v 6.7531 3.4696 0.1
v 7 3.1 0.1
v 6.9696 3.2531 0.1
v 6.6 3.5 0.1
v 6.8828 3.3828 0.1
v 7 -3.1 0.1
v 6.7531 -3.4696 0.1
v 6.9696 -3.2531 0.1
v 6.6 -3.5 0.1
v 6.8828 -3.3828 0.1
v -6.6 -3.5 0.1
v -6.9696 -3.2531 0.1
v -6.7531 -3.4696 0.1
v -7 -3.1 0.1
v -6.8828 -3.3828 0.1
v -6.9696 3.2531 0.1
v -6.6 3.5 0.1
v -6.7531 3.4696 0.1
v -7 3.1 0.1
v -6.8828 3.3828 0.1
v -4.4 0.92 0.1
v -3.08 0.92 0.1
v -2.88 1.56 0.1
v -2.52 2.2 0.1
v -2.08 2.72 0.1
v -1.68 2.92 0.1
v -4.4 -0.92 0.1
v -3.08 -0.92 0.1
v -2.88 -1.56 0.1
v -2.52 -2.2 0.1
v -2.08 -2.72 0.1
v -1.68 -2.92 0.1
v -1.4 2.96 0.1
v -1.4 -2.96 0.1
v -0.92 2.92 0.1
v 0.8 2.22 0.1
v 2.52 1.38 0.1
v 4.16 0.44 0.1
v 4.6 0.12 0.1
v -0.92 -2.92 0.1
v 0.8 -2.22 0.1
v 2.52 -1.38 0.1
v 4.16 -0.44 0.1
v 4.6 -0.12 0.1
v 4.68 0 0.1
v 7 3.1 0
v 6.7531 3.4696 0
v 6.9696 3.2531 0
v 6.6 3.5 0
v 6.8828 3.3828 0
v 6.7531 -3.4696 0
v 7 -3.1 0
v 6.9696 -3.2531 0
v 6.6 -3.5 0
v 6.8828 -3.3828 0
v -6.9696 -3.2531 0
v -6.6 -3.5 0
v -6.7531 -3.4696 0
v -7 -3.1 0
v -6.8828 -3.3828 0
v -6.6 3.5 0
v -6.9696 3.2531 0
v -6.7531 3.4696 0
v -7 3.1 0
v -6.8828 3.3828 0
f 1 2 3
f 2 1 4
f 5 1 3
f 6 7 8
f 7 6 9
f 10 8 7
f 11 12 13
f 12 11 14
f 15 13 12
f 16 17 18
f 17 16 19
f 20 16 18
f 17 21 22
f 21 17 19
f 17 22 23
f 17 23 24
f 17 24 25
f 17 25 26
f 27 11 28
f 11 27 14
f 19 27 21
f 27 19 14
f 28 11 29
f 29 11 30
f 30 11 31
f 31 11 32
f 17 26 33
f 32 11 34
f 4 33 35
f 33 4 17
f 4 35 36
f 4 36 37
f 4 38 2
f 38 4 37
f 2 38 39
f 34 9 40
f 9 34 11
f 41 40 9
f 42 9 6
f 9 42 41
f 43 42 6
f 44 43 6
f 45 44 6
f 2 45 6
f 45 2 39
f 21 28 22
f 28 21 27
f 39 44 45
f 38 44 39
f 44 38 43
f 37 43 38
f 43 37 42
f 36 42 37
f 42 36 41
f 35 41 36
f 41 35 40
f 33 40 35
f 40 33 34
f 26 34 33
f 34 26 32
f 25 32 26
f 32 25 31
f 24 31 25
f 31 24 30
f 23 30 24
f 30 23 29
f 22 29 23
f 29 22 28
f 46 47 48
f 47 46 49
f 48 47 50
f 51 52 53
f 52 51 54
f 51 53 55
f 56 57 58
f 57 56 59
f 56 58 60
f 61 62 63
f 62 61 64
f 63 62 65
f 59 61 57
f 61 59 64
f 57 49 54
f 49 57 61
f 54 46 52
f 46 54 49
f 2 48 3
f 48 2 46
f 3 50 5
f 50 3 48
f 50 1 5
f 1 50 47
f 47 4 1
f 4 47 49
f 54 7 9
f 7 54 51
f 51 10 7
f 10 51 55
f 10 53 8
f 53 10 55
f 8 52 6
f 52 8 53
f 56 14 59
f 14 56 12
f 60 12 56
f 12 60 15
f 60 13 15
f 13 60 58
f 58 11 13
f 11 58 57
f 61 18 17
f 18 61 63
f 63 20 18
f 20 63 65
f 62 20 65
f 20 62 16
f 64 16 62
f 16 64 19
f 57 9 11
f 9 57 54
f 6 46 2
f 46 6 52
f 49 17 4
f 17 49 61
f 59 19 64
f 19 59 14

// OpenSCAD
// file: ../p/4-4edge.scad
use <../lib.scad>
$fa=1; $fs=0.2;
function ldraw_lib__4_4edge(realsolid=false) = [
// 0 Circle 1.0
// 0 Name: 4-4edge.dat
// 0 Author: James Jessiman
// 0 !LDRAW_ORG Primitive UPDATE 2017-01
// 0 !LICENSE Licensed under CC BY 2.0 and CC BY 4.0 : see CAreadme.txt
// 
// 0 BFC CERTIFY CCW
  [0,"BFC","CERTIFY"],
  [0,"BFC","CCW"],
// 
// 0 !HISTORY 1998-12-15 [PTadmin] Official Update 1998-10
// 0 !HISTORY 2005-12-28 [PTadmin] Official Update 2005-01
// 0 !HISTORY 2007-06-24 [PTadmin] Header formatted for Contributor Agreement
// 0 !HISTORY 2008-07-01 [PTadmin] Official Update 2008-01
// 0 !HISTORY 2017-01-15 [Steffen] BFCed
// 0 !HISTORY 2017-12-30 [PTadmin] Official Update 2017-01
// 
// 
// 2 24 1 0 0 0.9239 0 0.3827
  [2,24,1,0,0,0.9239,0,0.3827],
// 2 24 0.9239 0 0.3827 0.7071 0 0.7071
  [2,24,0.9239,0,0.3827,0.7071,0,0.7071],
// 2 24 0.7071 0 0.7071 0.3827 0 0.9239
  [2,24,0.7071,0,0.7071,0.3827,0,0.9239],
// 2 24 0.3827 0 0.9239 0 0 1
  [2,24,0.3827,0,0.9239,0,0,1],
// 2 24 0 0 1 -0.3827 0 0.9239
  [2,24,0,0,1,-0.3827,0,0.9239],
// 2 24 -0.3827 0 0.9239 -0.7071 0 0.7071
  [2,24,-0.3827,0,0.9239,-0.7071,0,0.7071],
// 2 24 -0.7071 0 0.7071 -0.9239 0 0.3827
  [2,24,-0.7071,0,0.7071,-0.9239,0,0.3827],
// 2 24 -0.9239 0 0.3827 -1 0 -0
  [2,24,-0.9239,0,0.3827,-1,0,-0],
// 2 24 -1 0 -0 -0.9239 0 -0.3827
  [2,24,-1,0,-0,-0.9239,0,-0.3827],
// 2 24 -0.9239 0 -0.3827 -0.7071 0 -0.7071
  [2,24,-0.9239,0,-0.3827,-0.7071,0,-0.7071],
// 2 24 -0.7071 0 -0.7071 -0.3827 0 -0.9239
  [2,24,-0.7071,0,-0.7071,-0.3827,0,-0.9239],
// 2 24 -0.3827 0 -0.9239 0 0 -1
  [2,24,-0.3827,0,-0.9239,0,0,-1],
// 2 24 0 0 -1 0.3827 0 -0.9239
  [2,24,0,0,-1,0.3827,0,-0.9239],
// 2 24 0.3827 0 -0.9239 0.7071 0 -0.7071
  [2,24,0.3827,0,-0.9239,0.7071,0,-0.7071],
// 2 24 0.7071 0 -0.7071 0.9239 0 -0.3827
  [2,24,0.7071,0,-0.7071,0.9239,0,-0.3827],
// 2 24 0.9239 0 -0.3827 1 0 0
  [2,24,0.9239,0,-0.3827,1,0,0],
];
module ldraw_lib__4_4edge(step=0, col=false, unit=2/5, alt=false, line=0.2, solid=!$preview)
    makepoly(ldraw_lib__4_4edge(solid), step=step, col=col, unit=unit, alt=alt, line=line, solid=solid);
ldraw_lib__4_4edge(line=0.2);
// file: ../p/4-4disc.scad
use <../lib.scad>
$fa=1; $fs=0.2;
function ldraw_lib__4_4disc(realsolid=false) = [
// 0 Disc 1.0
// 0 Name: 4-4disc.dat
// 0 Author: James Jessiman
// 0 !LDRAW_ORG Primitive UPDATE 2002-02
// 0 !LICENSE Licensed under CC BY 2.0 and CC BY 4.0 : see CAreadme.txt
// 
// 0 BFC CERTIFY CCW
  [0,"BFC","CERTIFY"],
  [0,"BFC","CCW"],
// 
// 0 !HISTORY 1998-12-15 [PTadmin] Official Update 1998-10
// 0 !HISTORY 2002-03-23 [sbliss] Added BFC statement
// 0 !HISTORY 2002-04-25 [PTadmin] Official Update 2002-02
// 0 !HISTORY 2007-06-24 [PTadmin] Header formatted for Contributor Agreement
// 0 !HISTORY 2008-07-01 [PTadmin] Official Update 2008-01
// 
// 
// 3 16 0 0 0 1 0 0 0.9239 0 0.3827
  [3,16,0,0,0,1,0,0,0.9239,0,0.3827],
// 3 16 0 0 0 0.9239 0 0.3827 0.7071 0 0.7071
  [3,16,0,0,0,0.9239,0,0.3827,0.7071,0,0.7071],
// 3 16 0 0 0 0.7071 0 0.7071 0.3827 0 0.9239
  [3,16,0,0,0,0.7071,0,0.7071,0.3827,0,0.9239],
// 3 16 0 0 0 0.3827 0 0.9239 0 0 1
  [3,16,0,0,0,0.3827,0,0.9239,0,0,1],
// 3 16 0 0 0 0 0 1 -0.3827 0 0.9239
  [3,16,0,0,0,0,0,1,-0.3827,0,0.9239],
// 3 16 0 0 0 -0.3827 0 0.9239 -0.7071 0 0.7071
  [3,16,0,0,0,-0.3827,0,0.9239,-0.7071,0,0.7071],
// 3 16 0 0 0 -0.7071 0 0.7071 -0.9239 0 0.3827
  [3,16,0,0,0,-0.7071,0,0.7071,-0.9239,0,0.3827],
// 3 16 0 0 0 -0.9239 0 0.3827 -1 0 -0
  [3,16,0,0,0,-0.9239,0,0.3827,-1,0,-0],
// 3 16 0 0 0 -1 0 -0 -0.9239 0 -0.3827
  [3,16,0,0,0,-1,0,-0,-0.9239,0,-0.3827],
// 3 16 0 0 0 -0.9239 0 -0.3827 -0.7071 0 -0.7071
  [3,16,0,0,0,-0.9239,0,-0.3827,-0.7071,0,-0.7071],
// 3 16 0 0 0 -0.7071 0 -0.7071 -0.3827 0 -0.9239
  [3,16,0,0,0,-0.7071,0,-0.7071,-0.3827,0,-0.9239],
// 3 16 0 0 0 -0.3827 0 -0.9239 0 0 -1
  [3,16,0,0,0,-0.3827,0,-0.9239,0,0,-1],
// 3 16 0 0 0 0 0 -1 0.3827 0 -0.9239
  [3,16,0,0,0,0,0,-1,0.3827,0,-0.9239],
// 3 16 0 0 0 0.3827 0 -0.9239 0.7071 0 -0.7071
  [3,16,0,0,0,0.3827,0,-0.9239,0.7071,0,-0.7071],
// 3 16 0 0 0 0.7071 0 -0.7071 0.9239 0 -0.3827
  [3,16,0,0,0,0.7071,0,-0.7071,0.9239,0,-0.3827],
// 3 16 0 0 0 0.9239 0 -0.3827 1 0 0
  [3,16,0,0,0,0.9239,0,-0.3827,1,0,0],
// 0
];
module ldraw_lib__4_4disc(step=0, col=false, unit=2/5, alt=false, line=0.2, solid=!$preview)
    makepoly(ldraw_lib__4_4disc(solid), step=step, col=col, unit=unit, alt=alt, line=line, solid=solid);
ldraw_lib__4_4disc(line=0.2);
// file: ../p/4-4cyli.scad
use <../lib.scad>
$fa=1; $fs=0.2;
function ldraw_lib__4_4cyli(realsolid=false) = [
// 0 Cylinder 1.0
// 0 Name: 4-4cyli.dat
// 0 Author: James Jessiman
// 0 !LDRAW_ORG Primitive UPDATE 2005-01
// 0 !LICENSE Licensed under CC BY 2.0 and CC BY 4.0 : see CAreadme.txt
// 
// 0 BFC CERTIFY CCW
  [0,"BFC","CERTIFY"],
  [0,"BFC","CCW"],
// 
// 0 !HISTORY 1998-12-15 [PTadmin] Official Update 1998-10
// 0 !HISTORY 2002-03-23 [sbliss] Added BFC statement; merged headers from files in distributions LDraw 0.27 and Complete.
// 0 !HISTORY 2002-04-25 [PTadmin] Official Update 2002-02
// 0 !HISTORY 2004-12-14 [guyvivan] BFC CCW
// 0 !HISTORY 2005-12-28 [PTadmin] Official Update 2005-01
// 0 !HISTORY 2007-06-24 [PTadmin] Header formatted for Contributor Agreement
// 0 !HISTORY 2008-07-01 [PTadmin] Official Update 2008-01
// 
// 
// 4 16 1 1 0 0.9239 1 0.3827 0.9239 0 0.3827 1 0 0
  [4,16,1,1,0,0.9239,1,0.3827,0.9239,0,0.3827,1,0,0],
// 5 24 1 0 0 1 1 0 0.9239 0 0.3827 0.9239 0 -0.3827
  [5,24,1,0,0,1,1,0,0.9239,0,0.3827,0.9239,0,-0.3827],
// 4 16 0.9239 1 0.3827 0.7071 1 0.7071 0.7071 0 0.7071 0.9239 0 0.3827
  [4,16,0.9239,1,0.3827,0.7071,1,0.7071,0.7071,0,0.7071,0.9239,0,0.3827],
// 5 24 0.9239 0 0.3827 0.9239 1 0.3827 0.7071 0 0.7071 1 0 0
  [5,24,0.9239,0,0.3827,0.9239,1,0.3827,0.7071,0,0.7071,1,0,0],
// 4 16 0.7071 1 0.7071 0.3827 1 0.9239 0.3827 0 0.9239 0.7071 0 0.7071
  [4,16,0.7071,1,0.7071,0.3827,1,0.9239,0.3827,0,0.9239,0.7071,0,0.7071],
// 5 24 0.7071 0 0.7071 0.7071 1 0.7071 0.3827 0 0.9239 0.9239 0 0.3827
  [5,24,0.7071,0,0.7071,0.7071,1,0.7071,0.3827,0,0.9239,0.9239,0,0.3827],
// 4 16 0.3827 1 0.9239 0 1 1 0 0 1 0.3827 0 0.9239
  [4,16,0.3827,1,0.9239,0,1,1,0,0,1,0.3827,0,0.9239],
// 5 24 0.3827 0 0.9239 0.3827 1 0.9239 0 0 1 0.7071 0 0.7071
  [5,24,0.3827,0,0.9239,0.3827,1,0.9239,0,0,1,0.7071,0,0.7071],
// 4 16 0 1 1 -0.3827 1 0.9239 -0.3827 0 0.9239 0 0 1
  [4,16,0,1,1,-0.3827,1,0.9239,-0.3827,0,0.9239,0,0,1],
// 5 24 0 0 1 0 1 1 -0.3827 0 0.9239 0.3827 0 0.9239
  [5,24,0,0,1,0,1,1,-0.3827,0,0.9239,0.3827,0,0.9239],
// 4 16 -0.3827 1 0.9239 -0.7071 1 0.7071 -0.7071 0 0.7071 -0.3827 0 0.9239
  [4,16,-0.3827,1,0.9239,-0.7071,1,0.7071,-0.7071,0,0.7071,-0.3827,0,0.9239],
// 5 24 -0.3827 0 0.9239 -0.3827 1 0.9239 -0.7071 0 0.7071 0 0 1
  [5,24,-0.3827,0,0.9239,-0.3827,1,0.9239,-0.7071,0,0.7071,0,0,1],
// 4 16 -0.7071 1 0.7071 -0.9239 1 0.3827 -0.9239 0 0.3827 -0.7071 0 0.7071
  [4,16,-0.7071,1,0.7071,-0.9239,1,0.3827,-0.9239,0,0.3827,-0.7071,0,0.7071],
// 5 24 -0.7071 0 0.7071 -0.7071 1 0.7071 -0.9239 0 0.3827 -0.3827 0 0.9239
  [5,24,-0.7071,0,0.7071,-0.7071,1,0.7071,-0.9239,0,0.3827,-0.3827,0,0.9239],
// 4 16 -0.9239 1 0.3827 -1 1 0 -1 0 0 -0.9239 0 0.3827
  [4,16,-0.9239,1,0.3827,-1,1,0,-1,0,0,-0.9239,0,0.3827],
// 5 24 -0.9239 0 0.3827 -0.9239 1 0.3827 -1 0 0 -0.7071 0 0.7071
  [5,24,-0.9239,0,0.3827,-0.9239,1,0.3827,-1,0,0,-0.7071,0,0.7071],
// 4 16 -1 1 0 -0.9239 1 -0.3827 -0.9239 0 -0.3827 -1 0 0
  [4,16,-1,1,0,-0.9239,1,-0.3827,-0.9239,0,-0.3827,-1,0,0],
// 5 24 -1 0 0 -1 1 0 -0.9239 0 -0.3827 -0.9239 0 0.3827
  [5,24,-1,0,0,-1,1,0,-0.9239,0,-0.3827,-0.9239,0,0.3827],
// 4 16 -0.9239 1 -0.3827 -0.7071 1 -0.7071 -0.7071 0 -0.7071 -0.9239 0 -0.3827
  [4,16,-0.9239,1,-0.3827,-0.7071,1,-0.7071,-0.7071,0,-0.7071,-0.9239,0,-0.3827],
// 5 24 -0.9239 0 -0.3827 -0.9239 1 -0.3827 -0.7071 0 -0.7071 -1 0 0
  [5,24,-0.9239,0,-0.3827,-0.9239,1,-0.3827,-0.7071,0,-0.7071,-1,0,0],
// 4 16 -0.7071 1 -0.7071 -0.3827 1 -0.9239 -0.3827 0 -0.9239 -0.7071 0 -0.7071
  [4,16,-0.7071,1,-0.7071,-0.3827,1,-0.9239,-0.3827,0,-0.9239,-0.7071,0,-0.7071],
// 5 24 -0.7071 0 -0.7071 -0.7071 1 -0.7071 -0.3827 0 -0.9239 -0.9239 0 -0.3827
  [5,24,-0.7071,0,-0.7071,-0.7071,1,-0.7071,-0.3827,0,-0.9239,-0.9239,0,-0.3827],
// 4 16 -0.3827 1 -0.9239 0 1 -1 0 0 -1 -0.3827 0 -0.9239
  [4,16,-0.3827,1,-0.9239,0,1,-1,0,0,-1,-0.3827,0,-0.9239],
// 5 24 -0.3827 0 -0.9239 -0.3827 1 -0.9239 0 0 -1 -0.7071 0 -0.7071
  [5,24,-0.3827,0,-0.9239,-0.3827,1,-0.9239,0,0,-1,-0.7071,0,-0.7071],
// 4 16 0 1 -1 0.3827 1 -0.9239 0.3827 0 -0.9239 0 0 -1
  [4,16,0,1,-1,0.3827,1,-0.9239,0.3827,0,-0.9239,0,0,-1],
// 5 24 0 0 -1 0 1 -1 0.3827 0 -0.9239 -0.3827 0 -0.9239
  [5,24,0,0,-1,0,1,-1,0.3827,0,-0.9239,-0.3827,0,-0.9239],
// 4 16 0.3827 1 -0.9239 0.7071 1 -0.7071 0.7071 0 -0.7071 0.3827 0 -0.9239
  [4,16,0.3827,1,-0.9239,0.7071,1,-0.7071,0.7071,0,-0.7071,0.3827,0,-0.9239],
// 5 24 0.3827 0 -0.9239 0.3827 1 -0.9239 0.7071 0 -0.7071 0 0 -1
  [5,24,0.3827,0,-0.9239,0.3827,1,-0.9239,0.7071,0,-0.7071,0,0,-1],
// 4 16 0.7071 1 -0.7071 0.9239 1 -0.3827 0.9239 0 -0.3827 0.7071 0 -0.7071
  [4,16,0.7071,1,-0.7071,0.9239,1,-0.3827,0.9239,0,-0.3827,0.7071,0,-0.7071],
// 5 24 0.7071 0 -0.7071 0.7071 1 -0.7071 0.9239 0 -0.3827 0.3827 0 -0.9239
  [5,24,0.7071,0,-0.7071,0.7071,1,-0.7071,0.9239,0,-0.3827,0.3827,0,-0.9239],
// 4 16 0.9239 1 -0.3827 1 1 0 1 0 0 0.9239 0 -0.3827
  [4,16,0.9239,1,-0.3827,1,1,0,1,0,0,0.9239,0,-0.3827],
// 5 24 0.9239 0 -0.3827 0.9239 1 -0.3827 1 0 0 0.7071 0 -0.7071
  [5,24,0.9239,0,-0.3827,0.9239,1,-0.3827,1,0,0,0.7071,0,-0.7071],
// 0
];
module ldraw_lib__4_4cyli(step=0, col=false, unit=2/5, alt=false, line=0.2, solid=!$preview)
    makepoly(ldraw_lib__4_4cyli(solid), step=step, col=col, unit=unit, alt=alt, line=line, solid=solid);
ldraw_lib__4_4cyli(line=0.2);
// file: ../p/stud3.scad
use <../lib.scad>
use <4-4cyli.scad>
use <4-4disc.scad>
use <4-4edge.scad>
$fa=1; $fs=0.2;
function ldraw_lib__stud3(realsolid=false) = realsolid ? 
    [openscad(translate([0,0,-eps()], o=cylinder(4+eps(), r=4)),2)] : [
// 0 Stud Tube Solid
// 0 Name: stud3.dat
// 0 Author: James Jessiman
// 0 !LDRAW_ORG Primitive UPDATE 2012-01
// 0 !LICENSE Licensed under CC BY 2.0 and CC BY 4.0 : see CAreadme.txt
// 
// 0 BFC CERTIFY CCW
  [0,"BFC","CERTIFY"],
  [0,"BFC","CCW"],
// 
// 0 !HISTORY 2002-04-04 [sbliss] Modified for BFC compliance
// 0 !HISTORY 2002-04-25 [PTadmin] Official Update 2002-02
// 0 !HISTORY 2007-06-24 [PTadmin] Header formatted for Contributor Agreement
// 0 !HISTORY 2008-07-01 [PTadmin] Official Update 2008-01
// 0 !HISTORY 2012-02-16 [Philo] Changed to CCW
// 0 !HISTORY 2012-03-30 [PTadmin] Official Update 2012-01
// 
// 
// 1 16 0 -4 0 4 0 0 0 1 0 0 0 4 4-4edge.dat
  [1,16,0,-4,0,4,0,0,0,1,0,0,0,4, ldraw_lib__4_4edge(realsolid)],
// 1 16 0 0 0 4 0 0 0 1 0 0 0 4 4-4edge.dat
  [1,16,0,0,0,4,0,0,0,1,0,0,0,4, ldraw_lib__4_4edge(realsolid)],
// 1 16 0 -4 0 4 0 0 0 1 0 0 0 4 4-4disc.dat
  [1,16,0,-4,0,4,0,0,0,1,0,0,0,4, ldraw_lib__4_4disc(realsolid)],
// 1 16 0 -4 0 4 0 0 0 4 0 0 0 4 4-4cyli.dat
  [1,16,0,-4,0,4,0,0,0,4,0,0,0,4, ldraw_lib__4_4cyli(realsolid)],
];
module ldraw_lib__stud3(step=0, col=false, unit=2/5, alt=false, line=0.2, solid=!$preview)
    makepoly(ldraw_lib__stud3(solid), step=step, col=col, unit=unit, alt=alt, line=line, solid=solid);
ldraw_lib__stud3(line=0.2);
// file: ../p/stud.scad
use <../lib.scad>
use <4-4cyli.scad>
use <4-4disc.scad>
use <4-4edge.scad>
$fa=1; $fs=0.2;
function ldraw_lib__stud(realsolid=false) = realsolid ? 
    [openscad(translate([0,0,-eps()], o=cylinder(4+eps(), r=6)),2)] : [
// 0 Stud
// 0 Name: stud.dat
// 0 Author: James Jessiman
// 0 !LDRAW_ORG Primitive UPDATE 2012-01
// 0 !LICENSE Licensed under CC BY 2.0 and CC BY 4.0 : see CAreadme.txt
// 
// 0 BFC CERTIFY CCW
  [0,"BFC","CERTIFY"],
  [0,"BFC","CCW"],
// 
// 0 !HISTORY 2002-04-04 [sbliss] Modified for BFC compliance
// 0 !HISTORY 2002-04-25 [PTadmin] Official Update 2002-02
// 0 !HISTORY 2007-06-24 [PTadmin] Header formatted for Contributor Agreement
// 0 !HISTORY 2008-07-01 [PTadmin] Official Update 2008-01
// 0 !HISTORY 2012-02-16 [Philo] Changed to CCW
// 0 !HISTORY 2012-03-30 [PTadmin] Official Update 2012-01
// 
// 
// 1 16 0 0 0 6 0 0 0 1 0 0 0 6 4-4edge.dat
  [1,16,0,0,0,6,0,0,0,1,0,0,0,6, ldraw_lib__4_4edge(realsolid)],
// 1 16 0 -4 0 6 0 0 0 1 0 0 0 6 4-4edge.dat
  [1,16,0,-4,0,6,0,0,0,1,0,0,0,6, ldraw_lib__4_4edge(realsolid)],
// 1 16 0 0 0 6 0 0 0 -4 0 0 0 6 4-4cyli.dat
  [1,16,0,0,0,6,0,0,0,-4,0,0,0,6, ldraw_lib__4_4cyli(realsolid)],
// 1 16 0 -4 0 6 0 0 0 1 0 0 0 6 4-4disc.dat
  [1,16,0,-4,0,6,0,0,0,1,0,0,0,6, ldraw_lib__4_4disc(realsolid)],
];
module ldraw_lib__stud(step=0, col=false, unit=2/5, alt=false, line=0.2, solid=!$preview)
    makepoly(ldraw_lib__stud(solid), step=step, col=col, unit=unit, alt=alt, line=line, solid=solid);
ldraw_lib__stud(line=0.2);
// file: ../p/box5.scad
use <../lib.scad>
$fa=1; $fs=0.2;
function ldraw_lib__box5(realsolid=false) = [
// 0 Box with 5 Faces and All Edges
// 0 Name: box5.dat
// 0 Author: James Jessiman
// 0 !LDRAW_ORG Primitive UPDATE 2012-01
// 0 !LICENSE Licensed under CC BY 2.0 and CC BY 4.0 : see CAreadme.txt
// 
// 0 BFC CERTIFY CCW
  [0,"BFC","CERTIFY"],
  [0,"BFC","CCW"],
// 
// 0 !HISTORY 2002-04-03 [sbliss] Modified for BFC compliance
// 0 !HISTORY 2002-04-25 [PTadmin] Official Update 2002-02
// 0 !HISTORY 2007-06-24 [PTadmin] Header formatted for Contributor Agreement
// 0 !HISTORY 2008-07-01 [PTadmin] Official Update 2008-01
// 0 !HISTORY 2012-02-16 [Philo] Changed to CCW
// 0 !HISTORY 2012-03-30 [PTadmin] Official Update 2012-01
// 
// 
// 2 24 1 1 1 -1 1 1
  [2,24,1,1,1,-1,1,1],
// 2 24 -1 1 1 -1 1 -1
  [2,24,-1,1,1,-1,1,-1],
// 2 24 -1 1 -1 1 1 -1
  [2,24,-1,1,-1,1,1,-1],
// 2 24 1 1 -1 1 1 1
  [2,24,1,1,-1,1,1,1],
// 2 24 1 0 1 -1 0 1
  [2,24,1,0,1,-1,0,1],
// 2 24 -1 0 1 -1 0 -1
  [2,24,-1,0,1,-1,0,-1],
// 2 24 -1 0 -1 1 0 -1
  [2,24,-1,0,-1,1,0,-1],
// 2 24 1 0 -1 1 0 1
  [2,24,1,0,-1,1,0,1],
// 2 24 1 0 1 1 1 1
  [2,24,1,0,1,1,1,1],
// 2 24 -1 0 1 -1 1 1
  [2,24,-1,0,1,-1,1,1],
// 2 24 1 0 -1 1 1 -1
  [2,24,1,0,-1,1,1,-1],
// 2 24 -1 0 -1 -1 1 -1
  [2,24,-1,0,-1,-1,1,-1],
// 4 16 -1 1 1 1 1 1 1 1 -1 -1 1 -1
  [4,16,-1,1,1,1,1,1,1,1,-1,-1,1,-1],
// 4 16 -1 1 1 -1 0 1 1 0 1 1 1 1
  [4,16,-1,1,1,-1,0,1,1,0,1,1,1,1],
// 4 16 -1 1 -1 -1 0 -1 -1 0 1 -1 1 1
  [4,16,-1,1,-1,-1,0,-1,-1,0,1,-1,1,1],
// 4 16 1 1 -1 1 0 -1 -1 0 -1 -1 1 -1
  [4,16,1,1,-1,1,0,-1,-1,0,-1,-1,1,-1],
// 4 16 1 1 1 1 0 1 1 0 -1 1 1 -1
  [4,16,1,1,1,1,0,1,1,0,-1,1,1,-1],
];
module ldraw_lib__box5(step=0, col=false, unit=2/5, alt=false, line=0.2, solid=!$preview)
    makepoly(ldraw_lib__box5(solid), step=step, col=col, unit=unit, alt=alt, line=line, solid=solid);
ldraw_lib__box5(line=0.2);
// file: ../p/box4t.scad
use <../lib.scad>
$fa=1; $fs=0.2;
function ldraw_lib__box4t(realsolid=false) = [
// 0 Box with 4 Adjacent Faces and All Edges
// 0 Name: box4t.dat
// 0 Author: Tore Eriksson [Tore_Eriksson]
// 0 !LDRAW_ORG Primitive UPDATE 2003-02
// 0 !LICENSE Licensed under CC BY 2.0 and CC BY 4.0 : see CAreadme.txt
// 
// 0 BFC CERTIFY CCW
  [0,"BFC","CERTIFY"],
  [0,"BFC","CCW"],
// 
// 0 !HISTORY 1997-09-29 [PTadmin] Official Update 1997-15
// 0 !HISTORY 2002-08-31 [izanette] Modified with WINDZ for BFC compliance
// 0 !HISTORY 2003-08-01 [PTadmin] Official Update 2003-02
// 0 !HISTORY 2007-06-24 [PTadmin] Header formatted for Contributor Agreement
// 0 !HISTORY 2008-07-01 [PTadmin] Official Update 2008-01
// 
// 
// 2 24 1 1 1 -1 1 1
  [2,24,1,1,1,-1,1,1],
// 2 24 -1 1 1 -1 1 -1
  [2,24,-1,1,1,-1,1,-1],
// 2 24 -1 1 -1 1 1 -1
  [2,24,-1,1,-1,1,1,-1],
// 2 24 1 1 -1 1 1 1
  [2,24,1,1,-1,1,1,1],
// 2 24 1 0 1 -1 0 1
  [2,24,1,0,1,-1,0,1],
// 2 24 -1 0 1 -1 0 -1
  [2,24,-1,0,1,-1,0,-1],
// 2 24 -1 0 -1 1 0 -1
  [2,24,-1,0,-1,1,0,-1],
// 2 24 1 0 -1 1 0 1
  [2,24,1,0,-1,1,0,1],
// 2 24 1 0 1 1 1 1
  [2,24,1,0,1,1,1,1],
// 2 24 -1 0 1 -1 1 1
  [2,24,-1,0,1,-1,1,1],
// 2 24 1 0 -1 1 1 -1
  [2,24,1,0,-1,1,1,-1],
// 2 24 -1 0 -1 -1 1 -1
  [2,24,-1,0,-1,-1,1,-1],
// 4 16 1 1 1 1 1 -1 -1 1 -1 -1 1 1
  [4,16,1,1,1,1,1,-1,-1,1,-1,-1,1,1],
// 4 16 1 1 1 -1 1 1 -1 0 1 1 0 1
  [4,16,1,1,1,-1,1,1,-1,0,1,1,0,1],
// 4 16 -1 1 1 -1 1 -1 -1 0 -1 -1 0 1
  [4,16,-1,1,1,-1,1,-1,-1,0,-1,-1,0,1],
// 0 4 16 -1 1 -1 -1 0 -1 1 0 -1 1 1 -1
// 4 16 1 1 -1 1 1 1 1 0 1 1 0 -1
  [4,16,1,1,-1,1,1,1,1,0,1,1,0,-1],
// 0
];
module ldraw_lib__box4t(step=0, col=false, unit=2/5, alt=false, line=0.2, solid=!$preview)
    makepoly(ldraw_lib__box4t(solid), step=step, col=col, unit=unit, alt=alt, line=line, solid=solid);
ldraw_lib__box4t(line=0.2);
// file: s/3004s01.scad
use <../../lib.scad>
use <../../p/box4t.scad>
use <../../p/box5.scad>
use <../../p/stud.scad>
use <../../p/stud3.scad>
$fa=1; $fs=0.2;
function ldraw_lib__s__3004s01(realsolid=false) = [
// 0 ~Brick  1 x  2 without Front Face
// 0 Name: s\3004s01.dat
// 0 Author: James Jessiman
// 0 !LDRAW_ORG Subpart UPDATE 2003-03
// 0 !LICENSE Licensed under CC BY 2.0 and CC BY 4.0 : see CAreadme.txt
// 
// 0 BFC CERTIFY CCW
  [0,"BFC","CERTIFY"],
  [0,"BFC","CCW"],
// 
// 0 !HISTORY 2003-09-07 [jriley] Subfiling, BFC
// 0 !HISTORY 2003-12-19 [PTadmin] Official Update 2003-03
// 0 !HISTORY 2007-08-29 [PTadmin] Header formatted for Contributor Agreement
// 0 !HISTORY 2008-07-01 [PTadmin] Official Update 2008-01
// 
// 
// 1 16 0 4 0 1 0 0 0 -5 0 0 0 1 stud3.dat
  [1,16,0,4,0,1,0,0,0,-5,0,0,0,1, ldraw_lib__stud3(realsolid)],
// 0 BFC INVERTNEXT
  [0,"BFC","INVERTNEXT"],
// 1 16 0 24 0 16 0 0 0 -20 0 0 0 6 box5.dat
  [1,16,0,24,0,16,0,0,0,-20,0,0,0,6, ldraw_lib__box5(realsolid)],
// 4 16 20 24 10 16 24 6 -16 24 6 -20 24 10
  [4,16,20,24,10,16,24,6,-16,24,6,-20,24,10],
// 4 16 -20 24 10 -16 24 6 -16 24 -6 -20 24 -10
  [4,16,-20,24,10,-16,24,6,-16,24,-6,-20,24,-10],
// 4 16 -20 24 -10 -16 24 -6 16 24 -6 20 24 -10
  [4,16,-20,24,-10,-16,24,-6,16,24,-6,20,24,-10],
// 4 16 20 24 -10 16 24 -6 16 24 6 20 24 10
  [4,16,20,24,-10,16,24,-6,16,24,6,20,24,10],
// 1 16 0 24 0 20 0 0 0 -24 0 0 0 10 box4t.dat
  [1,16,0,24,0,20,0,0,0,-24,0,0,0,10, ldraw_lib__box4t(realsolid)],
// 1 16 10 0 0 1 0 0 0 1 0 0 0 1 stud.dat
  [1,16,10,0,0,1,0,0,0,1,0,0,0,1, ldraw_lib__stud(realsolid)],
// 1 16 -10 0 0 1 0 0 0 1 0 0 0 1 stud.dat
  [1,16,-10,0,0,1,0,0,0,1,0,0,0,1, ldraw_lib__stud(realsolid)],
// 0
];
module ldraw_lib__s__3004s01(step=0, col=false, unit=2/5, alt=false, line=0.2, solid=!$preview)
    makepoly(ldraw_lib__s__3004s01(solid), step=step, col=col, unit=unit, alt=alt, line=line, solid=solid);
ldraw_lib__s__3004s01(line=0.2);
// file: 3004.scad
use <../lib.scad>
use <s/3004s01.scad>
$fa=1; $fs=0.2;
function ldraw_lib__3004(realsolid=false) = [
// 0 Brick  1 x  2
// 0 Name: 3004.dat
// 0 Author: James Jessiman
// 0 !LDRAW_ORG Part UPDATE 2022-05
// 0 !LICENSE Licensed under CC BY 2.0 and CC BY 4.0 : see CAreadme.txt
// 
// 0 BFC CERTIFY CCW
  [0,"BFC","CERTIFY"],
  [0,"BFC","CCW"],
// 
// 0 !HISTORY 2001-10-26 [PTadmin] Official Update 2001-01
// 0 !HISTORY 2002-05-07 {unknown} BFC Certification
// 0 !HISTORY 2002-06-11 [PTadmin] Official Update 2002-03
// 0 !HISTORY 2007-05-07 [PTadmin] Header formatted for Contributor Agreement
// 0 !HISTORY 2008-07-01 [PTadmin] Official Update 2008-01
// 0 !HISTORY 2022-08-04 [MagFors] Using subfile
// 0 !HISTORY 2022-09-15 [PTadmin] Official Update 2022-05
// 
// 
// 1 16 0 0 0 1 0 0 0 1 0 0 0 1 s\3004s01.dat
  [1,16,0,0,0,1,0,0,0,1,0,0,0,1, ldraw_lib__s__3004s01(realsolid)],
// 4 16 -20 24 -10 20 24 -10 20 0 -10 -20 0 -10
  [4,16,-20,24,-10,20,24,-10,20,0,-10,-20,0,-10],
];
module ldraw_lib__3004(step=0, col=false, unit=2/5, alt=false, line=0.2, solid=!$preview)
    makepoly(ldraw_lib__3004(solid), step=step, col=col, unit=unit, alt=alt, line=line, solid=solid);
ldraw_lib__3004(line=0.2);
// file: ../p/1-4cyli.scad
use <../lib.scad>
$fa=1; $fs=0.2;
function ldraw_lib__1_4cyli(realsolid=false) = [
// 0 Cylinder 0.25
// 0 Name: 1-4cyli.dat
// 0 Author: James Jessiman
// 0 !LDRAW_ORG Primitive UPDATE 2012-01
// 0 !LICENSE Licensed under CC BY 2.0 and CC BY 4.0 : see CAreadme.txt
// 
// 0 BFC CERTIFY CCW
  [0,"BFC","CERTIFY"],
  [0,"BFC","CCW"],
// 
// 0 !HISTORY 2002-03-23 [sbliss] Added BFC statement.
// 0 !HISTORY 2002-04-25 [PTadmin] Official Update 2002-02
// 0 !HISTORY 2007-06-22 [PTadmin] Header formatted for Contributor Agreement
// 0 !HISTORY 2008-07-01 [PTadmin] Official Update 2008-01
// 0 !HISTORY 2012-02-16 [Philo] Changed to CCW
// 0 !HISTORY 2012-03-30 [PTadmin] Official Update 2012-01
// 
// 
// 4 16 1 1 0 0.9239 1 0.3827 0.9239 0 0.3827 1 0 0
  [4,16,1,1,0,0.9239,1,0.3827,0.9239,0,0.3827,1,0,0],
// 5 24 1 0 0 1 1 0 0.9239 0 0.3827 1 0 -1
  [5,24,1,0,0,1,1,0,0.9239,0,0.3827,1,0,-1],
// 4 16 0.9239 1 0.3827 0.7071 1 0.7071 0.7071 0 0.7071 0.9239 0 0.3827
  [4,16,0.9239,1,0.3827,0.7071,1,0.7071,0.7071,0,0.7071,0.9239,0,0.3827],
// 5 24 0.9239 0 0.3827 0.9239 1 0.3827 0.7071 0 0.7071 1 0 0
  [5,24,0.9239,0,0.3827,0.9239,1,0.3827,0.7071,0,0.7071,1,0,0],
// 4 16 0.7071 1 0.7071 0.3827 1 0.9239 0.3827 0 0.9239 0.7071 0 0.7071
  [4,16,0.7071,1,0.7071,0.3827,1,0.9239,0.3827,0,0.9239,0.7071,0,0.7071],
// 5 24 0.7071 0 0.7071 0.7071 1 0.7071 0.3827 0 0.9239 0.9239 0 0.3827
  [5,24,0.7071,0,0.7071,0.7071,1,0.7071,0.3827,0,0.9239,0.9239,0,0.3827],
// 4 16 0.3827 1 0.9239 0 1 1 0 0 1 0.3827 0 0.9239
  [4,16,0.3827,1,0.9239,0,1,1,0,0,1,0.3827,0,0.9239],
// 5 24 0.3827 0 0.9239 0.3827 1 0.9239 0 0 1 0.7071 0 0.7071
  [5,24,0.3827,0,0.9239,0.3827,1,0.9239,0,0,1,0.7071,0,0.7071],
// 5 24 0 0 1 0 1 1 0.3827 0 0.9239 -1 0 1
  [5,24,0,0,1,0,1,1,0.3827,0,0.9239,-1,0,1],
];
module ldraw_lib__1_4cyli(step=0, col=false, unit=2/5, alt=false, line=0.2, solid=!$preview)
    makepoly(ldraw_lib__1_4cyli(solid), step=step, col=col, unit=unit, alt=alt, line=line, solid=solid);
ldraw_lib__1_4cyli(line=0.2);
// file: ../p/1-4chrd.scad
use <../lib.scad>
$fa=1; $fs=0.2;
function ldraw_lib__1_4chrd(realsolid=false) = [
// 0 Chord 0.25
// 0 Name: 1-4chrd.dat
// 0 Author: Tony Hafner [hafhead]
// 0 !LDRAW_ORG Primitive UPDATE 2012-02
// 0 !LICENSE Licensed under CC BY 2.0 and CC BY 4.0 : see CAreadme.txt
// 
// 0 BFC CERTIFY CCW
  [0,"BFC","CERTIFY"],
  [0,"BFC","CCW"],
// 
// 0 !HISTORY 2004-04-22 [PTadmin] Official Update 2004-02
// 0 !HISTORY 2007-10-09 [PTadmin] Header formatted for Contributor Agreement
// 0 !HISTORY 2008-07-01 [PTadmin] Official Update 2008-01
// 0 !HISTORY 2012-08-02 [MMR1988] Re-creation with PrimGen2 and Rectifier
// 0 !HISTORY 2012-08-09 [PTadmin] Official Update 2012-02
// 
// 
// 4 16 0.9239 0 0.3827 0.3827 0 0.9239 0 0 1 1 0 0
  [4,16,0.9239,0,0.3827,0.3827,0,0.9239,0,0,1,1,0,0],
// 3 16 0.7071 0 0.7071 0.3827 0 0.9239 0.9239 0 0.3827
  [3,16,0.7071,0,0.7071,0.3827,0,0.9239,0.9239,0,0.3827],
];
module ldraw_lib__1_4chrd(step=0, col=false, unit=2/5, alt=false, line=0.2, solid=!$preview)
    makepoly(ldraw_lib__1_4chrd(solid), step=step, col=col, unit=unit, alt=alt, line=line, solid=solid);
ldraw_lib__1_4chrd(line=0.2);
// main file
use <../lib.scad>
use <../p/1-4chrd.scad>
use <../p/1-4cyli.scad>
$fa=1; $fs=0.2;
function ldraw_lib__6041468b(realsolid=false) = [
// 0 Sticker  0.9 x  1.9 with Dark Red Arrow
// 0 Name: 6041468b.dat
// 0 Author: Evert-Jan Boer [ejboer]
// 0 !LDRAW_ORG Part UPDATE 2022-04
// 0 !LICENSE Licensed under CC BY 2.0 and CC BY 4.0 : see CAreadme.txt
// 
// 0 BFC CERTIFY CCW
  [0,"BFC","CERTIFY"],
  [0,"BFC","CCW"],
// 
// 0 !KEYWORDS Set 10240, Star Wars, X-Wing
// 
// 0 !HISTORY 2022-07-18 [PTadmin] Official Update 2022-04
// 
// 
// 1 15 16.5 -.25 7.75 1 0 0 0 1 0 0 0 1 1-4chrd.dat
  [1,15,16.5,-.25,7.75,1,0,0,0,1,0,0,0,1, ldraw_lib__1_4chrd(realsolid)],
// 1 15 16.5 -.25 -7.75 0 0 1 0 1 0 -1 0 0 1-4chrd.dat
  [1,15,16.5,-.25,-7.75,0,0,1,0,1,0,-1,0,0, ldraw_lib__1_4chrd(realsolid)],
// 1 15 -16.5 -.25 -7.75 -1 0 0 0 1 0 0 0 -1 1-4chrd.dat
  [1,15,-16.5,-.25,-7.75,-1,0,0,0,1,0,0,0,-1, ldraw_lib__1_4chrd(realsolid)],
// 1 15 -16.5 -.25 7.75 0 0 -1 0 1 0 1 0 0 1-4chrd.dat
  [1,15,-16.5,-.25,7.75,0,0,-1,0,1,0,1,0,0, ldraw_lib__1_4chrd(realsolid)],
// 4 15 -17.5 -.25 7.75 -11 -.25 2.3 -7.7 -.25 2.3 -16.5 -.25 8.75
  [4,15,-17.5,-.25,7.75,-11,-.25,2.3,-7.7,-.25,2.3,-16.5,-.25,8.75],
// 3 15 -16.5 -.25 8.75 -7.7 -.25 2.3 -7.2 -.25 3.9
  [3,15,-16.5,-.25,8.75,-7.7,-.25,2.3,-7.2,-.25,3.9],
// 3 15 -16.5 -.25 8.75 -7.2 -.25 3.9 -6.3 -.25 5.5
  [3,15,-16.5,-.25,8.75,-7.2,-.25,3.9,-6.3,-.25,5.5],
// 3 15 -16.5 -.25 8.75 -6.3 -.25 5.5 -5.2 -.25 6.8
  [3,15,-16.5,-.25,8.75,-6.3,-.25,5.5,-5.2,-.25,6.8],
// 3 15 -16.5 -.25 8.75 -5.2 -.25 6.8 -4.2 -.25 7.3
  [3,15,-16.5,-.25,8.75,-5.2,-.25,6.8,-4.2,-.25,7.3],
// 4 15 -7.7 -.25 -2.3 -11 -.25 -2.3 -17.5 -.25 -7.75 -16.5 -.25 -8.75
  [4,15,-7.7,-.25,-2.3,-11,-.25,-2.3,-17.5,-.25,-7.75,-16.5,-.25,-8.75],
// 4 15 -11 -.25 -2.3 -11 -.25 2.3 -17.5 -.25 7.75 -17.5 -.25 -7.75
  [4,15,-11,-.25,-2.3,-11,-.25,2.3,-17.5,-.25,7.75,-17.5,-.25,-7.75],
// 3 15 -7.7 -.25 -2.3 -16.5 -.25 -8.75 -7.2 -.25 -3.9
  [3,15,-7.7,-.25,-2.3,-16.5,-.25,-8.75,-7.2,-.25,-3.9],
// 3 15 -7.2 -.25 -3.9 -16.5 -.25 -8.75 -6.3 -.25 -5.5
  [3,15,-7.2,-.25,-3.9,-16.5,-.25,-8.75,-6.3,-.25,-5.5],
// 3 15 -6.3 -.25 -5.5 -16.5 -.25 -8.75 -5.2 -.25 -6.8
  [3,15,-6.3,-.25,-5.5,-16.5,-.25,-8.75,-5.2,-.25,-6.8],
// 3 15 -5.2 -.25 -6.8 -16.5 -.25 -8.75 -4.2 -.25 -7.3
  [3,15,-5.2,-.25,-6.8,-16.5,-.25,-8.75,-4.2,-.25,-7.3],
// 3 15 -16.5 -.25 8.75 -4.2 -.25 7.3 -3.5 -.25 7.4
  [3,15,-16.5,-.25,8.75,-4.2,-.25,7.3,-3.5,-.25,7.4],
// 3 15 -4.2 -.25 -7.3 -16.5 -.25 -8.75 -3.5 -.25 -7.4
  [3,15,-4.2,-.25,-7.3,-16.5,-.25,-8.75,-3.5,-.25,-7.4],
// 4 15 -16.5 -.25 8.75 -3.5 -.25 7.4 -2.3 -.25 7.3 16.5 -.25 8.75
  [4,15,-16.5,-.25,8.75,-3.5,-.25,7.4,-2.3,-.25,7.3,16.5,-.25,8.75],
// 3 15 16.5 -.25 8.75 -2.3 -.25 7.3 2 -.25 5.55
  [3,15,16.5,-.25,8.75,-2.3,-.25,7.3,2,-.25,5.55],
// 3 15 16.5 -.25 8.75 2 -.25 5.55 6.3 -.25 3.45
  [3,15,16.5,-.25,8.75,2,-.25,5.55,6.3,-.25,3.45],
// 4 15 6.3 -.25 3.45 10.4 -.25 1.1 17.5 -.25 7.75 16.5 -.25 8.75
  [4,15,6.3,-.25,3.45,10.4,-.25,1.1,17.5,-.25,7.75,16.5,-.25,8.75],
// 3 15 17.5 -.25 7.75 10.4 -.25 1.1 11.5 -.25 .3
  [3,15,17.5,-.25,7.75,10.4,-.25,1.1,11.5,-.25,.3],
// 4 15 -16.5 -.25 -8.75 16.5 -.25 -8.75 -2.3 -.25 -7.3 -3.5 -.25 -7.4
  [4,15,-16.5,-.25,-8.75,16.5,-.25,-8.75,-2.3,-.25,-7.3,-3.5,-.25,-7.4],
// 3 15 2 -.25 -5.55 -2.3 -.25 -7.3 16.5 -.25 -8.75
  [3,15,2,-.25,-5.55,-2.3,-.25,-7.3,16.5,-.25,-8.75],
// 4 15 2 -.25 -5.55 16.5 -.25 -8.75 17.5 -.25 -7.75 6.3 -.25 -3.45
  [4,15,2,-.25,-5.55,16.5,-.25,-8.75,17.5,-.25,-7.75,6.3,-.25,-3.45],
// 3 15 10.4 -.25 -1.1 6.3 -.25 -3.45 17.5 -.25 -7.75
  [3,15,10.4,-.25,-1.1,6.3,-.25,-3.45,17.5,-.25,-7.75],
// 3 15 11.5 -.25 -.3 10.4 -.25 -1.1 17.5 -.25 -7.75
  [3,15,11.5,-.25,-.3,10.4,-.25,-1.1,17.5,-.25,-7.75],
// 3 15 11.7 -.25 0 11.5 -.25 -.3 17.5 -.25 -7.75
  [3,15,11.7,-.25,0,11.5,-.25,-.3,17.5,-.25,-7.75],
// 4 15 11.5 -.25 .3 11.7 -.25 0 17.5 -.25 -7.75 17.5 -.25 7.75
  [4,15,11.5,-.25,.3,11.7,-.25,0,17.5,-.25,-7.75,17.5,-.25,7.75],
// 4 320 -11 -.25 2.3 -11 -.25 -2.3 -7.7 -.25 -2.3 -7.7 -.25 2.3
  [4,320,-11,-.25,2.3,-11,-.25,-2.3,-7.7,-.25,-2.3,-7.7,-.25,2.3],
// 3 320 11.5 -.25 .3 11.5 -.25 -.3 11.7 -.25 0
  [3,320,11.5,-.25,.3,11.5,-.25,-.3,11.7,-.25,0],
// 4 320 10.4 -.25 1.1 10.4 -.25 -1.1 11.5 -.25 -.3 11.5 -.25 .3
  [4,320,10.4,-.25,1.1,10.4,-.25,-1.1,11.5,-.25,-.3,11.5,-.25,.3],
// 4 320 6.3 -.25 3.45 6.3 -.25 -3.45 10.4 -.25 -1.1 10.4 -.25 1.1
  [4,320,6.3,-.25,3.45,6.3,-.25,-3.45,10.4,-.25,-1.1,10.4,-.25,1.1],
// 4 320 2 -.25 5.55 2 -.25 -5.55 6.3 -.25 -3.45 6.3 -.25 3.45
  [4,320,2,-.25,5.55,2,-.25,-5.55,6.3,-.25,-3.45,6.3,-.25,3.45],
// 4 320 -2.3 -.25 7.3 -2.3 -.25 -7.3 2 -.25 -5.55 2 -.25 5.55
  [4,320,-2.3,-.25,7.3,-2.3,-.25,-7.3,2,-.25,-5.55,2,-.25,5.55],
// 4 320 -3.5 -.25 7.4 -3.5 -.25 -7.4 -2.3 -.25 -7.3 -2.3 -.25 7.3
  [4,320,-3.5,-.25,7.4,-3.5,-.25,-7.4,-2.3,-.25,-7.3,-2.3,-.25,7.3],
// 4 320 -4.2 -.25 7.3 -4.2 -.25 -7.3 -3.5 -.25 -7.4 -3.5 -.25 7.4
  [4,320,-4.2,-.25,7.3,-4.2,-.25,-7.3,-3.5,-.25,-7.4,-3.5,-.25,7.4],
// 4 320 -5.2 -.25 6.8 -5.2 -.25 -6.8 -4.2 -.25 -7.3 -4.2 -.25 7.3
  [4,320,-5.2,-.25,6.8,-5.2,-.25,-6.8,-4.2,-.25,-7.3,-4.2,-.25,7.3],
// 4 320 -6.3 -.25 5.5 -6.3 -.25 -5.5 -5.2 -.25 -6.8 -5.2 -.25 6.8
  [4,320,-6.3,-.25,5.5,-6.3,-.25,-5.5,-5.2,-.25,-6.8,-5.2,-.25,6.8],
// 4 320 -7.2 -.25 3.9 -7.2 -.25 -3.9 -6.3 -.25 -5.5 -6.3 -.25 5.5
  [4,320,-7.2,-.25,3.9,-7.2,-.25,-3.9,-6.3,-.25,-5.5,-6.3,-.25,5.5],
// 4 320 -7.7 -.25 2.3 -7.7 -.25 -2.3 -7.2 -.25 -3.9 -7.2 -.25 3.9
  [4,320,-7.7,-.25,2.3,-7.7,-.25,-2.3,-7.2,-.25,-3.9,-7.2,-.25,3.9],
// 
// 1 16 16.5 0 7.75 1 0 0 0 -1 0 0 0 1 1-4chrd.dat
  [1,16,16.5,0,7.75,1,0,0,0,-1,0,0,0,1, ldraw_lib__1_4chrd(realsolid)],
// 1 16 16.5 0 -7.75 0 0 1 0 -1 0 -1 0 0 1-4chrd.dat
  [1,16,16.5,0,-7.75,0,0,1,0,-1,0,-1,0,0, ldraw_lib__1_4chrd(realsolid)],
// 1 16 -16.5 0 -7.75 -1 0 0 0 -1 0 0 0 -1 1-4chrd.dat
  [1,16,-16.5,0,-7.75,-1,0,0,0,-1,0,0,0,-1, ldraw_lib__1_4chrd(realsolid)],
// 1 16 -16.5 0 7.75 0 0 -1 0 -1 0 1 0 0 1-4chrd.dat
  [1,16,-16.5,0,7.75,0,0,-1,0,-1,0,1,0,0, ldraw_lib__1_4chrd(realsolid)],
// 4 16 -16.5 0 -8.75 -17.5 0 -7.75 -17.5 0 7.75 -16.5 0 8.75
  [4,16,-16.5,0,-8.75,-17.5,0,-7.75,-17.5,0,7.75,-16.5,0,8.75],
// 4 16 16.5 0 8.75 16.5 0 -8.75 -16.5 0 -8.75 -16.5 0 8.75
  [4,16,16.5,0,8.75,16.5,0,-8.75,-16.5,0,-8.75,-16.5,0,8.75],
// 4 16 17.5 0 -7.75 16.5 0 -8.75 16.5 0 8.75 17.5 0 7.75
  [4,16,17.5,0,-7.75,16.5,0,-8.75,16.5,0,8.75,17.5,0,7.75],
// 
// 1 16 16.5 -.25 7.75 1 0 0 0 .25 0 0 0 1 1-4cyli.dat
  [1,16,16.5,-.25,7.75,1,0,0,0,.25,0,0,0,1, ldraw_lib__1_4cyli(realsolid)],
// 1 16 16.5 -.25 -7.75 0 0 1 0 .25 0 -1 0 0 1-4cyli.dat
  [1,16,16.5,-.25,-7.75,0,0,1,0,.25,0,-1,0,0, ldraw_lib__1_4cyli(realsolid)],
// 1 16 -16.5 -.25 -7.75 -1 0 0 0 .25 0 0 0 -1 1-4cyli.dat
  [1,16,-16.5,-.25,-7.75,-1,0,0,0,.25,0,0,0,-1, ldraw_lib__1_4cyli(realsolid)],
// 1 16 -16.5 -.25 7.75 0 0 -1 0 .25 0 1 0 0 1-4cyli.dat
  [1,16,-16.5,-.25,7.75,0,0,-1,0,.25,0,1,0,0, ldraw_lib__1_4cyli(realsolid)],
// 4 16 16.5 -.25 -8.75 -16.5 -.25 -8.75 -16.5 0 -8.75 16.5 0 -8.75
  [4,16,16.5,-.25,-8.75,-16.5,-.25,-8.75,-16.5,0,-8.75,16.5,0,-8.75],
// 4 16 17.5 -.25 7.75 17.5 -.25 -7.75 17.5 0 -7.75 17.5 0 7.75
  [4,16,17.5,-.25,7.75,17.5,-.25,-7.75,17.5,0,-7.75,17.5,0,7.75],
// 4 16 -16.5 -.25 8.75 16.5 -.25 8.75 16.5 0 8.75 -16.5 0 8.75
  [4,16,-16.5,-.25,8.75,16.5,-.25,8.75,16.5,0,8.75,-16.5,0,8.75],
// 4 16 -17.5 -.25 -7.75 -17.5 -.25 7.75 -17.5 0 7.75 -17.5 0 -7.75
  [4,16,-17.5,-.25,-7.75,-17.5,-.25,7.75,-17.5,0,7.75,-17.5,0,-7.75],
];
module ldraw_lib__6041468b(step=0, col=false, unit=2/5, alt=false, line=0.2, solid=!$preview)
    makepoly(ldraw_lib__6041468b(solid), step=step, col=col, unit=unit, alt=alt, line=line, solid=solid);
ldraw_lib__6041468b(line=0.2);
